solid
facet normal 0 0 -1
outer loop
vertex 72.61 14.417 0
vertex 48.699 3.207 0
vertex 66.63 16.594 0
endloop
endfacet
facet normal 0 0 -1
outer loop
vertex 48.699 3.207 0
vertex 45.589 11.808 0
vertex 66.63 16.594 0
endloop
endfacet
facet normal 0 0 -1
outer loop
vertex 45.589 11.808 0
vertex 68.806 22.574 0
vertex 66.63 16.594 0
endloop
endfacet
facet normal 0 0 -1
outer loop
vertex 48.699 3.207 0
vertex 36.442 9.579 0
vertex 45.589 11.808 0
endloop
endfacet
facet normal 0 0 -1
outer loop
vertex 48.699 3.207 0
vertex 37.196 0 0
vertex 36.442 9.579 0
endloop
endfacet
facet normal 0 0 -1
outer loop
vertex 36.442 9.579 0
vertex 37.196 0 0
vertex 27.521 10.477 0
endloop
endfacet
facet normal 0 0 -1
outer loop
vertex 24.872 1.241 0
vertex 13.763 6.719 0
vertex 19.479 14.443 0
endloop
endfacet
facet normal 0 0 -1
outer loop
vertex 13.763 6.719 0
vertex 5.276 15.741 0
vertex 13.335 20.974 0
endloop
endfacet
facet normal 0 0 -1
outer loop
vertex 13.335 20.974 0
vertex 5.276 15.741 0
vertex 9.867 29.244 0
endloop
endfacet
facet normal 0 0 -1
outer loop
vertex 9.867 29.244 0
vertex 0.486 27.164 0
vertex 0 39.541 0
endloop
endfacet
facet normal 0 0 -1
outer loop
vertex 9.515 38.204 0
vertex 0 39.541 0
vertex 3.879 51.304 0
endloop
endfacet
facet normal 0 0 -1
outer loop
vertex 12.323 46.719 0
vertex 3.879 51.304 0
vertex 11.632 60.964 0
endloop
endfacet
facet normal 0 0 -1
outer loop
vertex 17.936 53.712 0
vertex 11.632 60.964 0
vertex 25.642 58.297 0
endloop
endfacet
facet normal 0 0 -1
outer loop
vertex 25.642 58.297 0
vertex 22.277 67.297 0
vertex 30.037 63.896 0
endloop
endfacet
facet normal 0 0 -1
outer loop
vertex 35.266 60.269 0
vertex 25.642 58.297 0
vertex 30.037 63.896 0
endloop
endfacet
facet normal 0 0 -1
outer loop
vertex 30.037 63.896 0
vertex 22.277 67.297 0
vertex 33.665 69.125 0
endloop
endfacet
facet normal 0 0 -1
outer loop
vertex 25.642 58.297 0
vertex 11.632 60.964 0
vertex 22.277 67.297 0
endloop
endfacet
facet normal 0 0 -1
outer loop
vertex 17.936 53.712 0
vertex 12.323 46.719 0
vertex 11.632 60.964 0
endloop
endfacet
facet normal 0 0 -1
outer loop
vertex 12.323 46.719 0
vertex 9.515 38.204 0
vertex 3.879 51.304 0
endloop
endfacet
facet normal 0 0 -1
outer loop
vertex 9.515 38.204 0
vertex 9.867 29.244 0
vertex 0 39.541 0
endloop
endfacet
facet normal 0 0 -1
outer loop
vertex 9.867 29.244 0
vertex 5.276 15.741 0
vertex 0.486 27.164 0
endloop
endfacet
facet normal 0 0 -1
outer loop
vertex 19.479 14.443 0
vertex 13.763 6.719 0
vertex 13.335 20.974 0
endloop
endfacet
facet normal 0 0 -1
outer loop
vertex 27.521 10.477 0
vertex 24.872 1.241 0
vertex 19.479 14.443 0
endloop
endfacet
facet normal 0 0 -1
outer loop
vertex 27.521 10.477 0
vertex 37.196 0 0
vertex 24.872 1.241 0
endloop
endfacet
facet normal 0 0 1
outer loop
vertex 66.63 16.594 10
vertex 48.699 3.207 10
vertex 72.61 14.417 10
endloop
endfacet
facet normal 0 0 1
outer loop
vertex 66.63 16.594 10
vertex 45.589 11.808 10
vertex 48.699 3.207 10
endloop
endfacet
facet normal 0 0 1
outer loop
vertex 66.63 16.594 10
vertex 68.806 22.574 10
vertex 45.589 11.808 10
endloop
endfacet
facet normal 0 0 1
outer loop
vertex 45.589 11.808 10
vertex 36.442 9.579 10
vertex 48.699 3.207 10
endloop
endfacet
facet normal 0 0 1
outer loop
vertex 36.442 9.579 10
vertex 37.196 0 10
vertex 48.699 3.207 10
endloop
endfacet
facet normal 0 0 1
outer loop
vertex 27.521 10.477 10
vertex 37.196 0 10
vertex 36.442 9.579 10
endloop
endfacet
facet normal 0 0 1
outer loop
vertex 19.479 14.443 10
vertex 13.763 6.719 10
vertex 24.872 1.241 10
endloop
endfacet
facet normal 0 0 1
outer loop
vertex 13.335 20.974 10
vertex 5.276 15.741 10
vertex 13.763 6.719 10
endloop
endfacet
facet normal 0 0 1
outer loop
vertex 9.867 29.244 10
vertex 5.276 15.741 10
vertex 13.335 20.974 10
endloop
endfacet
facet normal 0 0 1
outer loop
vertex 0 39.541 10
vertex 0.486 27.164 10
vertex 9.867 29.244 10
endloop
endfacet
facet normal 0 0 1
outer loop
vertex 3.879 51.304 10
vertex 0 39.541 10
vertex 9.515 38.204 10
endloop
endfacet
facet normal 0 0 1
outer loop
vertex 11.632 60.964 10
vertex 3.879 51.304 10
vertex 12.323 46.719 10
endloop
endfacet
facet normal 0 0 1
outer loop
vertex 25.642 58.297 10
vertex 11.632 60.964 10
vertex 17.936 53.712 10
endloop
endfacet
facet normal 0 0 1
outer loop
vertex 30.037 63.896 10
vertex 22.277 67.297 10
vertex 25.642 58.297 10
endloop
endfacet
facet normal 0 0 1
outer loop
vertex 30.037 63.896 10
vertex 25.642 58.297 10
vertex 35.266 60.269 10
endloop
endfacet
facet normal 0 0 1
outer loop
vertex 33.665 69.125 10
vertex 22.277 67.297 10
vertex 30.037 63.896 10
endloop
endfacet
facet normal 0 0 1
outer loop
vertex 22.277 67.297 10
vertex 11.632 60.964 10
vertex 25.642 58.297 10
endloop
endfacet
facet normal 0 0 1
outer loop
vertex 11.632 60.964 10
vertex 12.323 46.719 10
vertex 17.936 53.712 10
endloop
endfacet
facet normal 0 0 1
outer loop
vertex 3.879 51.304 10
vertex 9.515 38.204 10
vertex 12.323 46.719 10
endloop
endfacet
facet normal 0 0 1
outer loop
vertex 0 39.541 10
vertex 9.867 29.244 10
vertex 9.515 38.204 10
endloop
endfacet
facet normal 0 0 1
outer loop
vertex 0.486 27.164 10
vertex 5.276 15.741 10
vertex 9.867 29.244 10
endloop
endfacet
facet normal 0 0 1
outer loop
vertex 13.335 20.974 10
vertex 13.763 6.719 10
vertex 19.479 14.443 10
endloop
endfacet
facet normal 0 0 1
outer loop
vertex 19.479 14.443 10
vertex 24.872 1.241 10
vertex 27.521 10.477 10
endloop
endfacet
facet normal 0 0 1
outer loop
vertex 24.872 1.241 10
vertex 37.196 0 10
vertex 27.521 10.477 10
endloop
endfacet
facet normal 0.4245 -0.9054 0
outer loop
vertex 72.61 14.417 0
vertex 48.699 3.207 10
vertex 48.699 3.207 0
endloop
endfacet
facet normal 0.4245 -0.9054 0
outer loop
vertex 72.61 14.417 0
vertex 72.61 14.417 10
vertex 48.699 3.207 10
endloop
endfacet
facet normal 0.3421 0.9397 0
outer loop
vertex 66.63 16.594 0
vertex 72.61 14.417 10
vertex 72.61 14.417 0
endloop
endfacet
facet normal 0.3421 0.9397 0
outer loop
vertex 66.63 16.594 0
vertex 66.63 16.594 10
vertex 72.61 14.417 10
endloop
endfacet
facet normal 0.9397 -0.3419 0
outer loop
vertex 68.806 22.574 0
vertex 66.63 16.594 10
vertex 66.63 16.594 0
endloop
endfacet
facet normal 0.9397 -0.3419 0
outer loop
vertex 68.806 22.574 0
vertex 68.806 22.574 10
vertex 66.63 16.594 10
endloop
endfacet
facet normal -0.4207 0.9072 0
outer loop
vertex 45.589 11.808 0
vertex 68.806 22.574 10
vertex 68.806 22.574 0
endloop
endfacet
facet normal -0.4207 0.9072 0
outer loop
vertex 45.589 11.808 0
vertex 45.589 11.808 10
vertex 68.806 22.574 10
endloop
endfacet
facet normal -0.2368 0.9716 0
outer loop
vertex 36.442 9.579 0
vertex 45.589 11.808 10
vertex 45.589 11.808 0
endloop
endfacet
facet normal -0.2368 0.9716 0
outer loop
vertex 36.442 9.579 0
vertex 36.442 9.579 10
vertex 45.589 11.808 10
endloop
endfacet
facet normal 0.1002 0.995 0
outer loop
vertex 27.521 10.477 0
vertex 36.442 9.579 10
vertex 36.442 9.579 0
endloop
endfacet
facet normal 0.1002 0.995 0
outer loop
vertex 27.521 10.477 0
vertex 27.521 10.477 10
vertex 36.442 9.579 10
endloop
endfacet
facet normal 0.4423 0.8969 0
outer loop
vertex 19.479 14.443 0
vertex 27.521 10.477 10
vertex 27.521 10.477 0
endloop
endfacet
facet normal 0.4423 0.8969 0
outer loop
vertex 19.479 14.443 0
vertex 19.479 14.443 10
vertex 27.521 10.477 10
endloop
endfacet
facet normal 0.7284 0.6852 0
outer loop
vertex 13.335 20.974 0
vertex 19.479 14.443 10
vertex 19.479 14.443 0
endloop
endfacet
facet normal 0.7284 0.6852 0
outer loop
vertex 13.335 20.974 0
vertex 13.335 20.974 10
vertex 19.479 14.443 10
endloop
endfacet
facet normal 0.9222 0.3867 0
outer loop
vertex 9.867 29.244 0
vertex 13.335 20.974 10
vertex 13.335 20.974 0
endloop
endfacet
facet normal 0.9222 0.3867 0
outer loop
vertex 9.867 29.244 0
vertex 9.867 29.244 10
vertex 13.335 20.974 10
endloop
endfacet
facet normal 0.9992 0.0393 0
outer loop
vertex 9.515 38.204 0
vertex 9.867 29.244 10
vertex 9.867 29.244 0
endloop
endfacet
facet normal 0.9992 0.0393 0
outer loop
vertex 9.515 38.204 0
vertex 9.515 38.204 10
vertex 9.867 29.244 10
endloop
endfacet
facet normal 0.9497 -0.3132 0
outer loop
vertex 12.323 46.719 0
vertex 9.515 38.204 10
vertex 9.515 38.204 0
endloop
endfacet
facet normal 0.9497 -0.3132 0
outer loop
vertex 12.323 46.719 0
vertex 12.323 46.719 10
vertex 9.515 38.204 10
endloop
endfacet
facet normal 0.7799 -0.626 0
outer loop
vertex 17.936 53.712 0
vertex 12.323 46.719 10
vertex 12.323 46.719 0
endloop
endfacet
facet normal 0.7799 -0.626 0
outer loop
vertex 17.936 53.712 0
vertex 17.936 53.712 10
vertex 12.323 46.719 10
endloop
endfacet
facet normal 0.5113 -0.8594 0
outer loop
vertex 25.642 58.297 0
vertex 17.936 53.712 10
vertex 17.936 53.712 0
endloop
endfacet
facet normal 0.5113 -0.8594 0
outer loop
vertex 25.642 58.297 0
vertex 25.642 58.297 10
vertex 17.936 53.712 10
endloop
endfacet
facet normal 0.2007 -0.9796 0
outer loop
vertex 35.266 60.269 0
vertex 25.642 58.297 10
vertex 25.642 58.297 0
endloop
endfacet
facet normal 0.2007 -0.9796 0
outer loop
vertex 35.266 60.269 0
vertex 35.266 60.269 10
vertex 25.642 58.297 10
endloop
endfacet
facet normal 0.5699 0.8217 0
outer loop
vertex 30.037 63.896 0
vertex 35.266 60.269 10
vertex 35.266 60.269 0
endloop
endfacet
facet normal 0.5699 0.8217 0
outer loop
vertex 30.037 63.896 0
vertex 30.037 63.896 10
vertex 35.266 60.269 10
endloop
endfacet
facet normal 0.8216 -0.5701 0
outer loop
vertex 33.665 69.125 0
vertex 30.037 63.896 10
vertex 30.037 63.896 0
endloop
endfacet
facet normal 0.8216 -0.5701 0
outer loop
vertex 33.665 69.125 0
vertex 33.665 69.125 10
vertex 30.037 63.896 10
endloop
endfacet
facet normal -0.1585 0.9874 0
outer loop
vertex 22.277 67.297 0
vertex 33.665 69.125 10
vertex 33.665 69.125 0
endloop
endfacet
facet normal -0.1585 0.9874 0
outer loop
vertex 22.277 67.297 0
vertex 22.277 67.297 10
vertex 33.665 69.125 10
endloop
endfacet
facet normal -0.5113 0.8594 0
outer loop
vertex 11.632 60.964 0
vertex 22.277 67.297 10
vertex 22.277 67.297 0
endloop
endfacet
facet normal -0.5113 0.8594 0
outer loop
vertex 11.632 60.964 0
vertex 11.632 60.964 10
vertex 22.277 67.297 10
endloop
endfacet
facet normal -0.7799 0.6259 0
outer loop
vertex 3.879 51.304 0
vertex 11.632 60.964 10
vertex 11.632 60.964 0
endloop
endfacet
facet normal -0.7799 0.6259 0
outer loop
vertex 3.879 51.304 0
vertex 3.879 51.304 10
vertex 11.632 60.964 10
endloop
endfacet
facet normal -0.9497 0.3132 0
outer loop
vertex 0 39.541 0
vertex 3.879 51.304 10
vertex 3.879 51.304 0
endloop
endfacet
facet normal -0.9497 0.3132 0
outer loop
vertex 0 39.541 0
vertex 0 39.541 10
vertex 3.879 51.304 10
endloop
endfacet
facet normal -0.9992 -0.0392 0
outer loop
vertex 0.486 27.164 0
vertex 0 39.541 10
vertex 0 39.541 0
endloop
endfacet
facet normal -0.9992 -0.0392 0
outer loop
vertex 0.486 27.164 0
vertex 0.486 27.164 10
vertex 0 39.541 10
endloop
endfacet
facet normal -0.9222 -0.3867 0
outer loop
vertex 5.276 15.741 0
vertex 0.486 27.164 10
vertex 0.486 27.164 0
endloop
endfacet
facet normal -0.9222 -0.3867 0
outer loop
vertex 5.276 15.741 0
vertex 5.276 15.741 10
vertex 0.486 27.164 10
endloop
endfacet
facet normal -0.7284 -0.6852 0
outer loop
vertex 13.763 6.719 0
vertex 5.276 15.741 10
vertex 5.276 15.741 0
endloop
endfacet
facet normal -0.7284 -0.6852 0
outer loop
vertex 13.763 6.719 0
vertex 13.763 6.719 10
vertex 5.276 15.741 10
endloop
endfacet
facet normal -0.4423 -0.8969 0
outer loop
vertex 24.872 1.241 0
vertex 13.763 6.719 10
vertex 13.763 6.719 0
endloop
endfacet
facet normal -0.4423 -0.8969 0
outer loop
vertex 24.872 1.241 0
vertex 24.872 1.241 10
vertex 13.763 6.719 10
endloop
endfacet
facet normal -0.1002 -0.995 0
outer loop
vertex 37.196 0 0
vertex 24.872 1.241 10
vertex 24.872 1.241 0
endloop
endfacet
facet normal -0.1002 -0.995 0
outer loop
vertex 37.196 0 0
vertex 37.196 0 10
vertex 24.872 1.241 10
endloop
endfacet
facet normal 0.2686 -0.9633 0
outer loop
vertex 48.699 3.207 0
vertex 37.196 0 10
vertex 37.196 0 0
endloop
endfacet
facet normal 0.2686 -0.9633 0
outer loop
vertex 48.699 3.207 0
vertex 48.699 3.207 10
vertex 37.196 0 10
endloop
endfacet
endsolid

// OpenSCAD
$fn = 32;

// ----------------------------------------------------------------------
// Hook plate: curl radius 30 mm over 205 degrees, 9 mm thick band
// ----------------------------------------------------------------------

// --- parameters (mm) ---
profile_height = 10;      // extrusion height
profile_points = 26;      // points of the closed outline

profile = [[30.037, 63.896], [33.665, 69.125], [22.277, 67.297], [11.632, 60.964], [3.879, 51.304], [0, 39.541], [0.486, 27.164], [5.276, 15.741], [13.763, 6.719], [24.872, 1.241], [37.196, 0], [48.699, 3.207], [72.61, 14.417], [66.63, 16.594], [68.806, 22.574], [45.589, 11.808], [36.442, 9.579], [27.521, 10.477], [19.479, 14.443], [13.335, 20.974], [9.867, 29.244], [9.515, 38.204], [12.323, 46.719], [17.936, 53.712], [25.642, 58.297], [35.266, 60.269]];  // single closed polygon, 26 points, counter clockwise

// --- the one profile operation ---
linear_extrude(height = profile_height) polygon(points = profile);
